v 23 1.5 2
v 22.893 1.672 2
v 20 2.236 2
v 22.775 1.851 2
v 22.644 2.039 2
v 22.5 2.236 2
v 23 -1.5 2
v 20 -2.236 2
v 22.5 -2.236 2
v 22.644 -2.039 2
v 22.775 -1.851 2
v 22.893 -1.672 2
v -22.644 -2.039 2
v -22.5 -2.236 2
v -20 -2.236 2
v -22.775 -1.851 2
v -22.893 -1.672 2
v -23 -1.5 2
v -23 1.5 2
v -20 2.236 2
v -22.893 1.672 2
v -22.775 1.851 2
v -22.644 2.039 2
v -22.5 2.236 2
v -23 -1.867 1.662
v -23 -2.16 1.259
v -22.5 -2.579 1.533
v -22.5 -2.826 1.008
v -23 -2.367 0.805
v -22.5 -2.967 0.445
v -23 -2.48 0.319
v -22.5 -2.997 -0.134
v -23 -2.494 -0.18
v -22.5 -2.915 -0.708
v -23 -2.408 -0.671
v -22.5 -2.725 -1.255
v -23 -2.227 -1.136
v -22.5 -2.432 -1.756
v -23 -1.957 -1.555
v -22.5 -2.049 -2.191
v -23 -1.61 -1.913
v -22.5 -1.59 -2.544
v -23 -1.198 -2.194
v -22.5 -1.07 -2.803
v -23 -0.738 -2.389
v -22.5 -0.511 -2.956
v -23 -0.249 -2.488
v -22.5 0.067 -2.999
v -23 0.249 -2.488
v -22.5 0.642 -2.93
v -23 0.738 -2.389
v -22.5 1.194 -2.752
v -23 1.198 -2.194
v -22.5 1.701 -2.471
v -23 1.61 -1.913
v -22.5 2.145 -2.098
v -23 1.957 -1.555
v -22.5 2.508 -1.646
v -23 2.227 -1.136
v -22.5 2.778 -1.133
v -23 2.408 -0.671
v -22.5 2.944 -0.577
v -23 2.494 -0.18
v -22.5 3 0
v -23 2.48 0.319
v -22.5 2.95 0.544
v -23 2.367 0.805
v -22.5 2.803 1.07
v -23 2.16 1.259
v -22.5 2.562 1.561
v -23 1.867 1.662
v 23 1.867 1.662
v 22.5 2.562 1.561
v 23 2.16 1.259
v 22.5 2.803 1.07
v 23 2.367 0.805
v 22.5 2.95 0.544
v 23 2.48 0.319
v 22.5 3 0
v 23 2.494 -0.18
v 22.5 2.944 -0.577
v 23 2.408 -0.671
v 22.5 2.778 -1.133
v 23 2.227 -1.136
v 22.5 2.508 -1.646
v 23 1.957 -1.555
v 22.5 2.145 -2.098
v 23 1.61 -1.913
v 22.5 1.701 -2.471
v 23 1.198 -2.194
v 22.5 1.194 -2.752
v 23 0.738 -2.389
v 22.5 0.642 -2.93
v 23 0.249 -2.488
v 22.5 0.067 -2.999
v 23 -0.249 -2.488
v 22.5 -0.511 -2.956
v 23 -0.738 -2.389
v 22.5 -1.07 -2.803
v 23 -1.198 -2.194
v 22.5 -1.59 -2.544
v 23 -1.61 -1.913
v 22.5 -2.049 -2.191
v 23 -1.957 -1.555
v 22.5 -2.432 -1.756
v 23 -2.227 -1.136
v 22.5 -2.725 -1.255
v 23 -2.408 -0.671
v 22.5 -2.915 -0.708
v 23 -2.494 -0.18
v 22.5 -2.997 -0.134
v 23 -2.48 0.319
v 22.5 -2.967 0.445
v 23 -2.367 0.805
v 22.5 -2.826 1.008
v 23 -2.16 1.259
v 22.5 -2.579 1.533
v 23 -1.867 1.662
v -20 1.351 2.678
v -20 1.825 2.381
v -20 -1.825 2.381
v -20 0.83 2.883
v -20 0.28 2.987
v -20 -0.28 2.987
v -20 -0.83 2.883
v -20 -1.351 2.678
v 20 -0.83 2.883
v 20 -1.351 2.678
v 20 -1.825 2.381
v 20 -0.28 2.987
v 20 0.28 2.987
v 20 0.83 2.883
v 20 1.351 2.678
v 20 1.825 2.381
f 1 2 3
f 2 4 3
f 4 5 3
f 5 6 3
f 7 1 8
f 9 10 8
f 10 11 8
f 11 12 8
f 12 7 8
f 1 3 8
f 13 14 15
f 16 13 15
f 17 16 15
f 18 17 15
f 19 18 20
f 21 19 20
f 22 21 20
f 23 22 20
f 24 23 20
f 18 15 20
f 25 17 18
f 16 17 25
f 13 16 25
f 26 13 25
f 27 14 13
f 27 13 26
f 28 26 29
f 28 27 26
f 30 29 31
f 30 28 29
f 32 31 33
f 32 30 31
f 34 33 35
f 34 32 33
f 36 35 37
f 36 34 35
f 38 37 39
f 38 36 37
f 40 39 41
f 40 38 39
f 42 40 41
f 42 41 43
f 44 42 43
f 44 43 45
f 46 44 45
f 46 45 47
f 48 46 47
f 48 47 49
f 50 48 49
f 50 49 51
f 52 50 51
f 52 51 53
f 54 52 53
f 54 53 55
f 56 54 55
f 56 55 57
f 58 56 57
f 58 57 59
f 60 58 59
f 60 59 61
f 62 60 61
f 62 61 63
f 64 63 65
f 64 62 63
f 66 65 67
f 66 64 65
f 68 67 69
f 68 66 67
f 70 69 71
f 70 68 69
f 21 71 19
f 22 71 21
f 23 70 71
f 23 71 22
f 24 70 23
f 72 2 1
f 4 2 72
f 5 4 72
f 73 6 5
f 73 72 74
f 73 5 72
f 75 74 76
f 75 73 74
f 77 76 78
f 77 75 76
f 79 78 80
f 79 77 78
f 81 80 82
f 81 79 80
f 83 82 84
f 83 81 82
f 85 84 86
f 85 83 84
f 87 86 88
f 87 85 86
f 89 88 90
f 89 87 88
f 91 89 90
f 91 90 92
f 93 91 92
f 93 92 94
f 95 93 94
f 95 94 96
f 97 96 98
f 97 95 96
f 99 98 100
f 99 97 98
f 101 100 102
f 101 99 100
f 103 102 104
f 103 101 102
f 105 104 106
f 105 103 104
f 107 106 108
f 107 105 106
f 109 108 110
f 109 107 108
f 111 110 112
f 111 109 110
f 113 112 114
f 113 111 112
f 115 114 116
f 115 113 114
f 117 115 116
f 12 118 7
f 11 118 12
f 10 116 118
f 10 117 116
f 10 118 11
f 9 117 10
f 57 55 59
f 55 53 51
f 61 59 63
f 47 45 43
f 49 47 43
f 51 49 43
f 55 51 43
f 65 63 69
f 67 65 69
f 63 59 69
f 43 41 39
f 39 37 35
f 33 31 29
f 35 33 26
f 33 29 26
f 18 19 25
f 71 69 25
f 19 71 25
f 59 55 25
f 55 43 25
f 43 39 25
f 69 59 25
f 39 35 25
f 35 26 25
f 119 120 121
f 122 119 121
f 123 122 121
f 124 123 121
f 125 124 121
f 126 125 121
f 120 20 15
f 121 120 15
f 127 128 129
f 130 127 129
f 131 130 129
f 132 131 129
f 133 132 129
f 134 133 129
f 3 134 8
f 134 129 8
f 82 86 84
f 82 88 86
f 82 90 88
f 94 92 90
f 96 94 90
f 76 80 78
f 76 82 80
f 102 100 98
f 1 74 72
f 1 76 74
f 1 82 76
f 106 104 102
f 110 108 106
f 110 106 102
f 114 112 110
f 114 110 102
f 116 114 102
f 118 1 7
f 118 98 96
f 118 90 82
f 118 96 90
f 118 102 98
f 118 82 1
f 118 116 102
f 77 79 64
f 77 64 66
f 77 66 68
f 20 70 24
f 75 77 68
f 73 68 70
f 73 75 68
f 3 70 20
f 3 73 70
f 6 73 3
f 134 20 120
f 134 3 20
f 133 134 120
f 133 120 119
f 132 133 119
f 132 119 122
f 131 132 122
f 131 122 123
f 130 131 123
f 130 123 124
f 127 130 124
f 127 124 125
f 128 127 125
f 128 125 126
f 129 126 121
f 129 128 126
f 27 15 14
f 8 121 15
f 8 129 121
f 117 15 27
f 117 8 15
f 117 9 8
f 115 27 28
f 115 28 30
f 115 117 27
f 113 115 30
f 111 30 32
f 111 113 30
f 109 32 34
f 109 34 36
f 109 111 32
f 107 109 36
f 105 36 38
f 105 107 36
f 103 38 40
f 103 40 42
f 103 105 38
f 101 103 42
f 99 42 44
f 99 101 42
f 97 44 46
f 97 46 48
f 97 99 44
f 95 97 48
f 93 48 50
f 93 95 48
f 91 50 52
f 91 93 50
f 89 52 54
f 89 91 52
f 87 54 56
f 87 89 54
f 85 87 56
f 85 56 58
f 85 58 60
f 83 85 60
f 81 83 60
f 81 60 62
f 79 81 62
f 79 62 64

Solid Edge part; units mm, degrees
sketch "Sketch1" plane through (0, 0, 0) normal (1, 0, 0) x (0, 1, 0)
  circle A0 centre (0, 0) radius 3
extrude "Protrusion1" add sketch "Sketch1" along normal mid plane 46
chamfer "Chamfer_1" distance 0.5 angle 45 1 edges at (23, -3, 0)
chamfer "Chamfer_2" distance 0.5 angle 45 1 edges at (-23, -3, 0)
sketch "Sketch2" plane through (23, 0, 0) normal (1, 0, 0) x (0, 1, 0)
  line L0 (-2.2361, 3.1915) -> (2.2361, 3.1915)
  line L1 (2.2361, 3.1915) -> (2.2361, 2)
  line L2 (0, 2) -> (2.2361, 2)
  line L3 (0, 2) -> (-2.2361, 2)
  line L4 (-2.2361, 2) -> (-2.2361, 3.1915)
extrude "ExtrudedCutout_1" cut sketch "Sketch2" along normal mid plane 6
mirror "Mirror1" about plane through (0, 0, 0) normal (1, 0, 0) of "ExtrudedCutout_1"
properties material "PVC"
